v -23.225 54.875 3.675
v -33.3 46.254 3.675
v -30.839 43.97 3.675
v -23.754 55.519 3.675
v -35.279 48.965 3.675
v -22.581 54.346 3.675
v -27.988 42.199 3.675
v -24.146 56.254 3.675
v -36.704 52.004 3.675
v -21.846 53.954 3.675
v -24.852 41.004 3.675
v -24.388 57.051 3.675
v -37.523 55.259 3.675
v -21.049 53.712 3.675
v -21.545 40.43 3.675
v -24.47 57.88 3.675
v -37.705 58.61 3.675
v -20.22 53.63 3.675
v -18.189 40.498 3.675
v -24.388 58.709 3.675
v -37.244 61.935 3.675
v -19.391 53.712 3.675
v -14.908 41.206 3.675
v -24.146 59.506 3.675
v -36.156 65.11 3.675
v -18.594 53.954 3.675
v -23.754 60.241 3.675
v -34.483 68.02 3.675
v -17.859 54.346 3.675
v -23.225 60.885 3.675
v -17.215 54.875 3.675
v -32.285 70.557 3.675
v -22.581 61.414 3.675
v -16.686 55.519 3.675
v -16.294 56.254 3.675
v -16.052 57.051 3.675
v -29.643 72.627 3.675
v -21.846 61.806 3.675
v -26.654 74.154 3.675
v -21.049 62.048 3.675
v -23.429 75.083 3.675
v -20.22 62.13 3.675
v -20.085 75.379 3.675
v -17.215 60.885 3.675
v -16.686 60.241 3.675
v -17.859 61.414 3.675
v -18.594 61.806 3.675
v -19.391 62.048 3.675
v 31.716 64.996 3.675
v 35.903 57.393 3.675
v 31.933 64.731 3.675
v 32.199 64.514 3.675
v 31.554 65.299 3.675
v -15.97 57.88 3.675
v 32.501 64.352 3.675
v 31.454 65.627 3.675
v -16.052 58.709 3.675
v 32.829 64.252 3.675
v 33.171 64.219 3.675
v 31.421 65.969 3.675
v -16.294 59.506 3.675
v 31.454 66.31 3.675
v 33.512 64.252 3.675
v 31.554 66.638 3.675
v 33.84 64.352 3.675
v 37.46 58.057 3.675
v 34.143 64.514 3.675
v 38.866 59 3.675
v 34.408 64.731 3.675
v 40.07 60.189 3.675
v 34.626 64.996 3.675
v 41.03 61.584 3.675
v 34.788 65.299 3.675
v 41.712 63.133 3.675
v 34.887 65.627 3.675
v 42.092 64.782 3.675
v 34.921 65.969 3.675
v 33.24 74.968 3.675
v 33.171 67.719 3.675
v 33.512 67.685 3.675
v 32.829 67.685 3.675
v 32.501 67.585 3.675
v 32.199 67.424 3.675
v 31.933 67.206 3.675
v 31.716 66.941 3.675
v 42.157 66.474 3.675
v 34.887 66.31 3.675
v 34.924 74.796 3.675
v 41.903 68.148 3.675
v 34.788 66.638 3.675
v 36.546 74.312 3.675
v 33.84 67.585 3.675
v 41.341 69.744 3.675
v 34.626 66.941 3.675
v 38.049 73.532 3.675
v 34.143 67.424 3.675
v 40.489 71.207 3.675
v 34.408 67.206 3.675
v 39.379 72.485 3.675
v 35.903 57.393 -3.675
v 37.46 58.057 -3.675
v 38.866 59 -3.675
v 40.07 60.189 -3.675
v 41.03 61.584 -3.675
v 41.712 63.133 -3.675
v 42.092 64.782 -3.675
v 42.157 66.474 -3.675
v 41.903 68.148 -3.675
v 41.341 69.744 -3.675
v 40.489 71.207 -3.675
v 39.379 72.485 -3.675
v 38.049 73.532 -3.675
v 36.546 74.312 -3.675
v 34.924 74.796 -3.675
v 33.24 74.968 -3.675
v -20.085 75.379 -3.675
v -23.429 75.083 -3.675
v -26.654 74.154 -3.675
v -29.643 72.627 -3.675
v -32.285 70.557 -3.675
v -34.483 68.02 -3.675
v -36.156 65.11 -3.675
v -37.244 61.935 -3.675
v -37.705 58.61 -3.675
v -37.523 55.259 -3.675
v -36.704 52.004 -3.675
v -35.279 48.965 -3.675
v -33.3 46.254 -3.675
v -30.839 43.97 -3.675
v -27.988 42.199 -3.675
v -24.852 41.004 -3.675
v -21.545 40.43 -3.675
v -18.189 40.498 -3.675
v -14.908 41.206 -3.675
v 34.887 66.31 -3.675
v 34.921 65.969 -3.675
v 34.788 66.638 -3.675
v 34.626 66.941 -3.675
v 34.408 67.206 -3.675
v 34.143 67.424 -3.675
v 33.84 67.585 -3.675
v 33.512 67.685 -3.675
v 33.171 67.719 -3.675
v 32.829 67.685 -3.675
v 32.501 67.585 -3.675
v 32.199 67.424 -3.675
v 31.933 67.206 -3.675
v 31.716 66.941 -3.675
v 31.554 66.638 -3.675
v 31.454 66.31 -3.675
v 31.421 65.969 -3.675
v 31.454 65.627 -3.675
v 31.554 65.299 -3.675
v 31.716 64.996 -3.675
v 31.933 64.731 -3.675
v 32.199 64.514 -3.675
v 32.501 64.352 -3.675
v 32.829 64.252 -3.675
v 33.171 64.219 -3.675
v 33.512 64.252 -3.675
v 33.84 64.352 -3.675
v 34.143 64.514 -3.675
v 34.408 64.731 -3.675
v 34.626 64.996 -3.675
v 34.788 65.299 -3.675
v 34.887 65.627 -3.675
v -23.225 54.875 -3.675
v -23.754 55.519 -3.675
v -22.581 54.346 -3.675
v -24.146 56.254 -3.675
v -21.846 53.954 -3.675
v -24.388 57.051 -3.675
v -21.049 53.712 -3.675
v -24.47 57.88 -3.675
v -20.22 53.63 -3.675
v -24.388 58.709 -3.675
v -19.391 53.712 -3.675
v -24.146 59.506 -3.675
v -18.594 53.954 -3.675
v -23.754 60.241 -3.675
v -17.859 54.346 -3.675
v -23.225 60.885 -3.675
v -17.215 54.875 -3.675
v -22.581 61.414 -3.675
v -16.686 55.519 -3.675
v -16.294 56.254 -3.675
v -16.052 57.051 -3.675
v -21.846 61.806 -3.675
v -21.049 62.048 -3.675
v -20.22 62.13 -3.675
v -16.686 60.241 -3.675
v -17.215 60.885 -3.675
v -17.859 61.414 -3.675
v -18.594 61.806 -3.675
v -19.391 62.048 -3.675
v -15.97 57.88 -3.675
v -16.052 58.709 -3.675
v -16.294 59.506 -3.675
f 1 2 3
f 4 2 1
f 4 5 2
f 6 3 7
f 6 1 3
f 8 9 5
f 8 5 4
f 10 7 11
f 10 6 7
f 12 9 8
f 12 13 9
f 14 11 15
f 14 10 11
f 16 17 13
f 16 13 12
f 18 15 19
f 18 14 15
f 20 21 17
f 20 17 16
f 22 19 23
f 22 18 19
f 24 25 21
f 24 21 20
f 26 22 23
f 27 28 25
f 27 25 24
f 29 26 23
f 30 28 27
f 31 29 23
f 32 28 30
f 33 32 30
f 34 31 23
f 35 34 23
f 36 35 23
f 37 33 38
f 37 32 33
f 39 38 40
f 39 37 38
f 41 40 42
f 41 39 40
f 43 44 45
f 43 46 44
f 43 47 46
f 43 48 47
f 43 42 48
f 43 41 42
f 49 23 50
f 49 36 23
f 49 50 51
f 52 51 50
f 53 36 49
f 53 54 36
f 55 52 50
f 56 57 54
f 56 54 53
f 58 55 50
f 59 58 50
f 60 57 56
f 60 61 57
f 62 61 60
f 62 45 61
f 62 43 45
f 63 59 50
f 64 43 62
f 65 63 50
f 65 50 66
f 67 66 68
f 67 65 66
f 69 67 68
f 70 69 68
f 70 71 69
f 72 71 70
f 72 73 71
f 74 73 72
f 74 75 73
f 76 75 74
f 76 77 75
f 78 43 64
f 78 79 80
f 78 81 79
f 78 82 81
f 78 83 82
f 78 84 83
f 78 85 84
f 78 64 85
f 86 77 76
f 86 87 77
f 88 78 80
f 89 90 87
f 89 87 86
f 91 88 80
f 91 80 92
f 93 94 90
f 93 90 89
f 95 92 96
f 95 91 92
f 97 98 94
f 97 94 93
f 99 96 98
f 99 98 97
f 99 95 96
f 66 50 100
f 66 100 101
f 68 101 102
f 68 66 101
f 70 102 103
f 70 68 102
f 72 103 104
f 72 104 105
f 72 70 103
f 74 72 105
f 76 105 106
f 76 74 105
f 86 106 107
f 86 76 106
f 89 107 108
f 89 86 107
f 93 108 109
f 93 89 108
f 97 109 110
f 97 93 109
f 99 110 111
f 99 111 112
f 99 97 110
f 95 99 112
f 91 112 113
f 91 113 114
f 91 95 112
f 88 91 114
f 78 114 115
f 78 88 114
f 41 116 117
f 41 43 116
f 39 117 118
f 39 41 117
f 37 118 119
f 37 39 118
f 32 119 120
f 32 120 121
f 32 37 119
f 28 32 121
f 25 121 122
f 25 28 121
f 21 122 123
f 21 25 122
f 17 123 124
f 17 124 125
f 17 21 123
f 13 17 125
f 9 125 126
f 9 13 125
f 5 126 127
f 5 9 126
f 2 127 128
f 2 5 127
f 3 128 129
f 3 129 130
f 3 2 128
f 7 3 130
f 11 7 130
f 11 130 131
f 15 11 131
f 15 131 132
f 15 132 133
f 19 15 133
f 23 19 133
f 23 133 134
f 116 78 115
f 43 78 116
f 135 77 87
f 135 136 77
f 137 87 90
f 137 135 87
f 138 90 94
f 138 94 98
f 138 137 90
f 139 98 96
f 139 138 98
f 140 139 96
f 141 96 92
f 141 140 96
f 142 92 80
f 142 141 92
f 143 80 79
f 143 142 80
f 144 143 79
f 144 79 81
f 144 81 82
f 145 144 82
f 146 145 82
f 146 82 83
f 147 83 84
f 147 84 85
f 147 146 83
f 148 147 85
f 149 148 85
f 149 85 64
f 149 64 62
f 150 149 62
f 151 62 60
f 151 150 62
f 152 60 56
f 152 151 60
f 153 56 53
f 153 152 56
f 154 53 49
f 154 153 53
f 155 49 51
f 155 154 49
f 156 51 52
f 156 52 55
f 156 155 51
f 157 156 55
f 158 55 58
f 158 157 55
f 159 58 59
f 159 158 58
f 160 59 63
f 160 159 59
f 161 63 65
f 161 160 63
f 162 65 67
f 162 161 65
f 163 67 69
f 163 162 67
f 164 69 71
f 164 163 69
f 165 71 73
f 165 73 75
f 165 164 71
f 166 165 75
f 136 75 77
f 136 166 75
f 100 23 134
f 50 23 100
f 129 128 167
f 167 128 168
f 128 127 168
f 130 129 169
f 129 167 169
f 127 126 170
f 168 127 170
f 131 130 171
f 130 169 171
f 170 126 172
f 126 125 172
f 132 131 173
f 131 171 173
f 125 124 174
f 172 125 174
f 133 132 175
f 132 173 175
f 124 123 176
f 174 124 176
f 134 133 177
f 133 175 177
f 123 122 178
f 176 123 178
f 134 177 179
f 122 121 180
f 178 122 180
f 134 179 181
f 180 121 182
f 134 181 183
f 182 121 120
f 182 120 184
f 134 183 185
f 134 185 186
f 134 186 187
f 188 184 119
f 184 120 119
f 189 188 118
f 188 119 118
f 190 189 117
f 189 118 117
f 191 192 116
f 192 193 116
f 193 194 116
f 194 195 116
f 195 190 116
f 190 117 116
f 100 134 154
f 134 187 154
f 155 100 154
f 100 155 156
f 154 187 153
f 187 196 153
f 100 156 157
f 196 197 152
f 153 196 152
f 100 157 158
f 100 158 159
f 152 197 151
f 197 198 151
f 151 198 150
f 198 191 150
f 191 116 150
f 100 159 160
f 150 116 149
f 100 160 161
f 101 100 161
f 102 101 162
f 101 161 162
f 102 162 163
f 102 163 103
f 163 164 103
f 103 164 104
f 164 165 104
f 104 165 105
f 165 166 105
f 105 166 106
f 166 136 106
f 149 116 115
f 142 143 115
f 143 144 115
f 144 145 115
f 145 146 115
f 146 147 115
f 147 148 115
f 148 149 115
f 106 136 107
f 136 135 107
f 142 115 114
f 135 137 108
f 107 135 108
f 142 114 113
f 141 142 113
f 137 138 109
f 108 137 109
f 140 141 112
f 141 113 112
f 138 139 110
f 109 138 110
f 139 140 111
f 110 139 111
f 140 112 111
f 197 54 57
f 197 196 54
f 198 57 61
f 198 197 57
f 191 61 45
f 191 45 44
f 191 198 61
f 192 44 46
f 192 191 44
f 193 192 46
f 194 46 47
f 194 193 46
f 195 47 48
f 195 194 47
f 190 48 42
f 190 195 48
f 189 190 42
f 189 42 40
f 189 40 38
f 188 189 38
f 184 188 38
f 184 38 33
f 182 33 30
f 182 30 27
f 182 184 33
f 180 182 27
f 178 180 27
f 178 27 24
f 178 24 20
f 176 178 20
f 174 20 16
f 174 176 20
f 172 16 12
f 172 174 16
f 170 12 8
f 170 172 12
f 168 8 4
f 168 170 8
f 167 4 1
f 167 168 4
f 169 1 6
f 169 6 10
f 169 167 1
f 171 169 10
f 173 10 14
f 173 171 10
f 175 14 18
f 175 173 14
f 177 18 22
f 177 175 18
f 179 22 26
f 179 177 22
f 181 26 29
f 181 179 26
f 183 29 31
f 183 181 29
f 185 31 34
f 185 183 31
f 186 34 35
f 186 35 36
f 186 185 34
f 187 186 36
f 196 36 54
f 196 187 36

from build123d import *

# Parameters (mm, degrees)
SKETCH3_R           = 4.25
SKETCH3_R_2         = 1.75
BOSS_EXTRUDE4_DEPTH = 3.675


with BuildPart() as part:
    # Sketch3 → Boss-Extrude4 (new, symmetric)
    with BuildSketch(Plane.XY):
        with BuildLine():
            ThreePointArc((-20.085093872, 75.379480002), (-37.522562339, 55.258676576), (-14.907803169, 41.205751446))
            Line((-14.907803169, 41.205751446), (35.902750732, 57.393327309))
            ThreePointArc((35.902750732, 57.393327309), (42.069224422, 67.316764326), (33.240144084, 74.968387709))
            Line((33.240144084, 74.968387709), (-20.085093872, 75.379480002))
        make_face()
        with Locations((-20.22, 57.88)):
            Circle(SKETCH3_R, mode=Mode.SUBTRACT)
        with Locations((33.17076379, 65.968655136)):
            Circle(SKETCH3_R_2, mode=Mode.SUBTRACT)
    extrude(amount=BOSS_EXTRUDE4_DEPTH, both=True)


solid = part.part
